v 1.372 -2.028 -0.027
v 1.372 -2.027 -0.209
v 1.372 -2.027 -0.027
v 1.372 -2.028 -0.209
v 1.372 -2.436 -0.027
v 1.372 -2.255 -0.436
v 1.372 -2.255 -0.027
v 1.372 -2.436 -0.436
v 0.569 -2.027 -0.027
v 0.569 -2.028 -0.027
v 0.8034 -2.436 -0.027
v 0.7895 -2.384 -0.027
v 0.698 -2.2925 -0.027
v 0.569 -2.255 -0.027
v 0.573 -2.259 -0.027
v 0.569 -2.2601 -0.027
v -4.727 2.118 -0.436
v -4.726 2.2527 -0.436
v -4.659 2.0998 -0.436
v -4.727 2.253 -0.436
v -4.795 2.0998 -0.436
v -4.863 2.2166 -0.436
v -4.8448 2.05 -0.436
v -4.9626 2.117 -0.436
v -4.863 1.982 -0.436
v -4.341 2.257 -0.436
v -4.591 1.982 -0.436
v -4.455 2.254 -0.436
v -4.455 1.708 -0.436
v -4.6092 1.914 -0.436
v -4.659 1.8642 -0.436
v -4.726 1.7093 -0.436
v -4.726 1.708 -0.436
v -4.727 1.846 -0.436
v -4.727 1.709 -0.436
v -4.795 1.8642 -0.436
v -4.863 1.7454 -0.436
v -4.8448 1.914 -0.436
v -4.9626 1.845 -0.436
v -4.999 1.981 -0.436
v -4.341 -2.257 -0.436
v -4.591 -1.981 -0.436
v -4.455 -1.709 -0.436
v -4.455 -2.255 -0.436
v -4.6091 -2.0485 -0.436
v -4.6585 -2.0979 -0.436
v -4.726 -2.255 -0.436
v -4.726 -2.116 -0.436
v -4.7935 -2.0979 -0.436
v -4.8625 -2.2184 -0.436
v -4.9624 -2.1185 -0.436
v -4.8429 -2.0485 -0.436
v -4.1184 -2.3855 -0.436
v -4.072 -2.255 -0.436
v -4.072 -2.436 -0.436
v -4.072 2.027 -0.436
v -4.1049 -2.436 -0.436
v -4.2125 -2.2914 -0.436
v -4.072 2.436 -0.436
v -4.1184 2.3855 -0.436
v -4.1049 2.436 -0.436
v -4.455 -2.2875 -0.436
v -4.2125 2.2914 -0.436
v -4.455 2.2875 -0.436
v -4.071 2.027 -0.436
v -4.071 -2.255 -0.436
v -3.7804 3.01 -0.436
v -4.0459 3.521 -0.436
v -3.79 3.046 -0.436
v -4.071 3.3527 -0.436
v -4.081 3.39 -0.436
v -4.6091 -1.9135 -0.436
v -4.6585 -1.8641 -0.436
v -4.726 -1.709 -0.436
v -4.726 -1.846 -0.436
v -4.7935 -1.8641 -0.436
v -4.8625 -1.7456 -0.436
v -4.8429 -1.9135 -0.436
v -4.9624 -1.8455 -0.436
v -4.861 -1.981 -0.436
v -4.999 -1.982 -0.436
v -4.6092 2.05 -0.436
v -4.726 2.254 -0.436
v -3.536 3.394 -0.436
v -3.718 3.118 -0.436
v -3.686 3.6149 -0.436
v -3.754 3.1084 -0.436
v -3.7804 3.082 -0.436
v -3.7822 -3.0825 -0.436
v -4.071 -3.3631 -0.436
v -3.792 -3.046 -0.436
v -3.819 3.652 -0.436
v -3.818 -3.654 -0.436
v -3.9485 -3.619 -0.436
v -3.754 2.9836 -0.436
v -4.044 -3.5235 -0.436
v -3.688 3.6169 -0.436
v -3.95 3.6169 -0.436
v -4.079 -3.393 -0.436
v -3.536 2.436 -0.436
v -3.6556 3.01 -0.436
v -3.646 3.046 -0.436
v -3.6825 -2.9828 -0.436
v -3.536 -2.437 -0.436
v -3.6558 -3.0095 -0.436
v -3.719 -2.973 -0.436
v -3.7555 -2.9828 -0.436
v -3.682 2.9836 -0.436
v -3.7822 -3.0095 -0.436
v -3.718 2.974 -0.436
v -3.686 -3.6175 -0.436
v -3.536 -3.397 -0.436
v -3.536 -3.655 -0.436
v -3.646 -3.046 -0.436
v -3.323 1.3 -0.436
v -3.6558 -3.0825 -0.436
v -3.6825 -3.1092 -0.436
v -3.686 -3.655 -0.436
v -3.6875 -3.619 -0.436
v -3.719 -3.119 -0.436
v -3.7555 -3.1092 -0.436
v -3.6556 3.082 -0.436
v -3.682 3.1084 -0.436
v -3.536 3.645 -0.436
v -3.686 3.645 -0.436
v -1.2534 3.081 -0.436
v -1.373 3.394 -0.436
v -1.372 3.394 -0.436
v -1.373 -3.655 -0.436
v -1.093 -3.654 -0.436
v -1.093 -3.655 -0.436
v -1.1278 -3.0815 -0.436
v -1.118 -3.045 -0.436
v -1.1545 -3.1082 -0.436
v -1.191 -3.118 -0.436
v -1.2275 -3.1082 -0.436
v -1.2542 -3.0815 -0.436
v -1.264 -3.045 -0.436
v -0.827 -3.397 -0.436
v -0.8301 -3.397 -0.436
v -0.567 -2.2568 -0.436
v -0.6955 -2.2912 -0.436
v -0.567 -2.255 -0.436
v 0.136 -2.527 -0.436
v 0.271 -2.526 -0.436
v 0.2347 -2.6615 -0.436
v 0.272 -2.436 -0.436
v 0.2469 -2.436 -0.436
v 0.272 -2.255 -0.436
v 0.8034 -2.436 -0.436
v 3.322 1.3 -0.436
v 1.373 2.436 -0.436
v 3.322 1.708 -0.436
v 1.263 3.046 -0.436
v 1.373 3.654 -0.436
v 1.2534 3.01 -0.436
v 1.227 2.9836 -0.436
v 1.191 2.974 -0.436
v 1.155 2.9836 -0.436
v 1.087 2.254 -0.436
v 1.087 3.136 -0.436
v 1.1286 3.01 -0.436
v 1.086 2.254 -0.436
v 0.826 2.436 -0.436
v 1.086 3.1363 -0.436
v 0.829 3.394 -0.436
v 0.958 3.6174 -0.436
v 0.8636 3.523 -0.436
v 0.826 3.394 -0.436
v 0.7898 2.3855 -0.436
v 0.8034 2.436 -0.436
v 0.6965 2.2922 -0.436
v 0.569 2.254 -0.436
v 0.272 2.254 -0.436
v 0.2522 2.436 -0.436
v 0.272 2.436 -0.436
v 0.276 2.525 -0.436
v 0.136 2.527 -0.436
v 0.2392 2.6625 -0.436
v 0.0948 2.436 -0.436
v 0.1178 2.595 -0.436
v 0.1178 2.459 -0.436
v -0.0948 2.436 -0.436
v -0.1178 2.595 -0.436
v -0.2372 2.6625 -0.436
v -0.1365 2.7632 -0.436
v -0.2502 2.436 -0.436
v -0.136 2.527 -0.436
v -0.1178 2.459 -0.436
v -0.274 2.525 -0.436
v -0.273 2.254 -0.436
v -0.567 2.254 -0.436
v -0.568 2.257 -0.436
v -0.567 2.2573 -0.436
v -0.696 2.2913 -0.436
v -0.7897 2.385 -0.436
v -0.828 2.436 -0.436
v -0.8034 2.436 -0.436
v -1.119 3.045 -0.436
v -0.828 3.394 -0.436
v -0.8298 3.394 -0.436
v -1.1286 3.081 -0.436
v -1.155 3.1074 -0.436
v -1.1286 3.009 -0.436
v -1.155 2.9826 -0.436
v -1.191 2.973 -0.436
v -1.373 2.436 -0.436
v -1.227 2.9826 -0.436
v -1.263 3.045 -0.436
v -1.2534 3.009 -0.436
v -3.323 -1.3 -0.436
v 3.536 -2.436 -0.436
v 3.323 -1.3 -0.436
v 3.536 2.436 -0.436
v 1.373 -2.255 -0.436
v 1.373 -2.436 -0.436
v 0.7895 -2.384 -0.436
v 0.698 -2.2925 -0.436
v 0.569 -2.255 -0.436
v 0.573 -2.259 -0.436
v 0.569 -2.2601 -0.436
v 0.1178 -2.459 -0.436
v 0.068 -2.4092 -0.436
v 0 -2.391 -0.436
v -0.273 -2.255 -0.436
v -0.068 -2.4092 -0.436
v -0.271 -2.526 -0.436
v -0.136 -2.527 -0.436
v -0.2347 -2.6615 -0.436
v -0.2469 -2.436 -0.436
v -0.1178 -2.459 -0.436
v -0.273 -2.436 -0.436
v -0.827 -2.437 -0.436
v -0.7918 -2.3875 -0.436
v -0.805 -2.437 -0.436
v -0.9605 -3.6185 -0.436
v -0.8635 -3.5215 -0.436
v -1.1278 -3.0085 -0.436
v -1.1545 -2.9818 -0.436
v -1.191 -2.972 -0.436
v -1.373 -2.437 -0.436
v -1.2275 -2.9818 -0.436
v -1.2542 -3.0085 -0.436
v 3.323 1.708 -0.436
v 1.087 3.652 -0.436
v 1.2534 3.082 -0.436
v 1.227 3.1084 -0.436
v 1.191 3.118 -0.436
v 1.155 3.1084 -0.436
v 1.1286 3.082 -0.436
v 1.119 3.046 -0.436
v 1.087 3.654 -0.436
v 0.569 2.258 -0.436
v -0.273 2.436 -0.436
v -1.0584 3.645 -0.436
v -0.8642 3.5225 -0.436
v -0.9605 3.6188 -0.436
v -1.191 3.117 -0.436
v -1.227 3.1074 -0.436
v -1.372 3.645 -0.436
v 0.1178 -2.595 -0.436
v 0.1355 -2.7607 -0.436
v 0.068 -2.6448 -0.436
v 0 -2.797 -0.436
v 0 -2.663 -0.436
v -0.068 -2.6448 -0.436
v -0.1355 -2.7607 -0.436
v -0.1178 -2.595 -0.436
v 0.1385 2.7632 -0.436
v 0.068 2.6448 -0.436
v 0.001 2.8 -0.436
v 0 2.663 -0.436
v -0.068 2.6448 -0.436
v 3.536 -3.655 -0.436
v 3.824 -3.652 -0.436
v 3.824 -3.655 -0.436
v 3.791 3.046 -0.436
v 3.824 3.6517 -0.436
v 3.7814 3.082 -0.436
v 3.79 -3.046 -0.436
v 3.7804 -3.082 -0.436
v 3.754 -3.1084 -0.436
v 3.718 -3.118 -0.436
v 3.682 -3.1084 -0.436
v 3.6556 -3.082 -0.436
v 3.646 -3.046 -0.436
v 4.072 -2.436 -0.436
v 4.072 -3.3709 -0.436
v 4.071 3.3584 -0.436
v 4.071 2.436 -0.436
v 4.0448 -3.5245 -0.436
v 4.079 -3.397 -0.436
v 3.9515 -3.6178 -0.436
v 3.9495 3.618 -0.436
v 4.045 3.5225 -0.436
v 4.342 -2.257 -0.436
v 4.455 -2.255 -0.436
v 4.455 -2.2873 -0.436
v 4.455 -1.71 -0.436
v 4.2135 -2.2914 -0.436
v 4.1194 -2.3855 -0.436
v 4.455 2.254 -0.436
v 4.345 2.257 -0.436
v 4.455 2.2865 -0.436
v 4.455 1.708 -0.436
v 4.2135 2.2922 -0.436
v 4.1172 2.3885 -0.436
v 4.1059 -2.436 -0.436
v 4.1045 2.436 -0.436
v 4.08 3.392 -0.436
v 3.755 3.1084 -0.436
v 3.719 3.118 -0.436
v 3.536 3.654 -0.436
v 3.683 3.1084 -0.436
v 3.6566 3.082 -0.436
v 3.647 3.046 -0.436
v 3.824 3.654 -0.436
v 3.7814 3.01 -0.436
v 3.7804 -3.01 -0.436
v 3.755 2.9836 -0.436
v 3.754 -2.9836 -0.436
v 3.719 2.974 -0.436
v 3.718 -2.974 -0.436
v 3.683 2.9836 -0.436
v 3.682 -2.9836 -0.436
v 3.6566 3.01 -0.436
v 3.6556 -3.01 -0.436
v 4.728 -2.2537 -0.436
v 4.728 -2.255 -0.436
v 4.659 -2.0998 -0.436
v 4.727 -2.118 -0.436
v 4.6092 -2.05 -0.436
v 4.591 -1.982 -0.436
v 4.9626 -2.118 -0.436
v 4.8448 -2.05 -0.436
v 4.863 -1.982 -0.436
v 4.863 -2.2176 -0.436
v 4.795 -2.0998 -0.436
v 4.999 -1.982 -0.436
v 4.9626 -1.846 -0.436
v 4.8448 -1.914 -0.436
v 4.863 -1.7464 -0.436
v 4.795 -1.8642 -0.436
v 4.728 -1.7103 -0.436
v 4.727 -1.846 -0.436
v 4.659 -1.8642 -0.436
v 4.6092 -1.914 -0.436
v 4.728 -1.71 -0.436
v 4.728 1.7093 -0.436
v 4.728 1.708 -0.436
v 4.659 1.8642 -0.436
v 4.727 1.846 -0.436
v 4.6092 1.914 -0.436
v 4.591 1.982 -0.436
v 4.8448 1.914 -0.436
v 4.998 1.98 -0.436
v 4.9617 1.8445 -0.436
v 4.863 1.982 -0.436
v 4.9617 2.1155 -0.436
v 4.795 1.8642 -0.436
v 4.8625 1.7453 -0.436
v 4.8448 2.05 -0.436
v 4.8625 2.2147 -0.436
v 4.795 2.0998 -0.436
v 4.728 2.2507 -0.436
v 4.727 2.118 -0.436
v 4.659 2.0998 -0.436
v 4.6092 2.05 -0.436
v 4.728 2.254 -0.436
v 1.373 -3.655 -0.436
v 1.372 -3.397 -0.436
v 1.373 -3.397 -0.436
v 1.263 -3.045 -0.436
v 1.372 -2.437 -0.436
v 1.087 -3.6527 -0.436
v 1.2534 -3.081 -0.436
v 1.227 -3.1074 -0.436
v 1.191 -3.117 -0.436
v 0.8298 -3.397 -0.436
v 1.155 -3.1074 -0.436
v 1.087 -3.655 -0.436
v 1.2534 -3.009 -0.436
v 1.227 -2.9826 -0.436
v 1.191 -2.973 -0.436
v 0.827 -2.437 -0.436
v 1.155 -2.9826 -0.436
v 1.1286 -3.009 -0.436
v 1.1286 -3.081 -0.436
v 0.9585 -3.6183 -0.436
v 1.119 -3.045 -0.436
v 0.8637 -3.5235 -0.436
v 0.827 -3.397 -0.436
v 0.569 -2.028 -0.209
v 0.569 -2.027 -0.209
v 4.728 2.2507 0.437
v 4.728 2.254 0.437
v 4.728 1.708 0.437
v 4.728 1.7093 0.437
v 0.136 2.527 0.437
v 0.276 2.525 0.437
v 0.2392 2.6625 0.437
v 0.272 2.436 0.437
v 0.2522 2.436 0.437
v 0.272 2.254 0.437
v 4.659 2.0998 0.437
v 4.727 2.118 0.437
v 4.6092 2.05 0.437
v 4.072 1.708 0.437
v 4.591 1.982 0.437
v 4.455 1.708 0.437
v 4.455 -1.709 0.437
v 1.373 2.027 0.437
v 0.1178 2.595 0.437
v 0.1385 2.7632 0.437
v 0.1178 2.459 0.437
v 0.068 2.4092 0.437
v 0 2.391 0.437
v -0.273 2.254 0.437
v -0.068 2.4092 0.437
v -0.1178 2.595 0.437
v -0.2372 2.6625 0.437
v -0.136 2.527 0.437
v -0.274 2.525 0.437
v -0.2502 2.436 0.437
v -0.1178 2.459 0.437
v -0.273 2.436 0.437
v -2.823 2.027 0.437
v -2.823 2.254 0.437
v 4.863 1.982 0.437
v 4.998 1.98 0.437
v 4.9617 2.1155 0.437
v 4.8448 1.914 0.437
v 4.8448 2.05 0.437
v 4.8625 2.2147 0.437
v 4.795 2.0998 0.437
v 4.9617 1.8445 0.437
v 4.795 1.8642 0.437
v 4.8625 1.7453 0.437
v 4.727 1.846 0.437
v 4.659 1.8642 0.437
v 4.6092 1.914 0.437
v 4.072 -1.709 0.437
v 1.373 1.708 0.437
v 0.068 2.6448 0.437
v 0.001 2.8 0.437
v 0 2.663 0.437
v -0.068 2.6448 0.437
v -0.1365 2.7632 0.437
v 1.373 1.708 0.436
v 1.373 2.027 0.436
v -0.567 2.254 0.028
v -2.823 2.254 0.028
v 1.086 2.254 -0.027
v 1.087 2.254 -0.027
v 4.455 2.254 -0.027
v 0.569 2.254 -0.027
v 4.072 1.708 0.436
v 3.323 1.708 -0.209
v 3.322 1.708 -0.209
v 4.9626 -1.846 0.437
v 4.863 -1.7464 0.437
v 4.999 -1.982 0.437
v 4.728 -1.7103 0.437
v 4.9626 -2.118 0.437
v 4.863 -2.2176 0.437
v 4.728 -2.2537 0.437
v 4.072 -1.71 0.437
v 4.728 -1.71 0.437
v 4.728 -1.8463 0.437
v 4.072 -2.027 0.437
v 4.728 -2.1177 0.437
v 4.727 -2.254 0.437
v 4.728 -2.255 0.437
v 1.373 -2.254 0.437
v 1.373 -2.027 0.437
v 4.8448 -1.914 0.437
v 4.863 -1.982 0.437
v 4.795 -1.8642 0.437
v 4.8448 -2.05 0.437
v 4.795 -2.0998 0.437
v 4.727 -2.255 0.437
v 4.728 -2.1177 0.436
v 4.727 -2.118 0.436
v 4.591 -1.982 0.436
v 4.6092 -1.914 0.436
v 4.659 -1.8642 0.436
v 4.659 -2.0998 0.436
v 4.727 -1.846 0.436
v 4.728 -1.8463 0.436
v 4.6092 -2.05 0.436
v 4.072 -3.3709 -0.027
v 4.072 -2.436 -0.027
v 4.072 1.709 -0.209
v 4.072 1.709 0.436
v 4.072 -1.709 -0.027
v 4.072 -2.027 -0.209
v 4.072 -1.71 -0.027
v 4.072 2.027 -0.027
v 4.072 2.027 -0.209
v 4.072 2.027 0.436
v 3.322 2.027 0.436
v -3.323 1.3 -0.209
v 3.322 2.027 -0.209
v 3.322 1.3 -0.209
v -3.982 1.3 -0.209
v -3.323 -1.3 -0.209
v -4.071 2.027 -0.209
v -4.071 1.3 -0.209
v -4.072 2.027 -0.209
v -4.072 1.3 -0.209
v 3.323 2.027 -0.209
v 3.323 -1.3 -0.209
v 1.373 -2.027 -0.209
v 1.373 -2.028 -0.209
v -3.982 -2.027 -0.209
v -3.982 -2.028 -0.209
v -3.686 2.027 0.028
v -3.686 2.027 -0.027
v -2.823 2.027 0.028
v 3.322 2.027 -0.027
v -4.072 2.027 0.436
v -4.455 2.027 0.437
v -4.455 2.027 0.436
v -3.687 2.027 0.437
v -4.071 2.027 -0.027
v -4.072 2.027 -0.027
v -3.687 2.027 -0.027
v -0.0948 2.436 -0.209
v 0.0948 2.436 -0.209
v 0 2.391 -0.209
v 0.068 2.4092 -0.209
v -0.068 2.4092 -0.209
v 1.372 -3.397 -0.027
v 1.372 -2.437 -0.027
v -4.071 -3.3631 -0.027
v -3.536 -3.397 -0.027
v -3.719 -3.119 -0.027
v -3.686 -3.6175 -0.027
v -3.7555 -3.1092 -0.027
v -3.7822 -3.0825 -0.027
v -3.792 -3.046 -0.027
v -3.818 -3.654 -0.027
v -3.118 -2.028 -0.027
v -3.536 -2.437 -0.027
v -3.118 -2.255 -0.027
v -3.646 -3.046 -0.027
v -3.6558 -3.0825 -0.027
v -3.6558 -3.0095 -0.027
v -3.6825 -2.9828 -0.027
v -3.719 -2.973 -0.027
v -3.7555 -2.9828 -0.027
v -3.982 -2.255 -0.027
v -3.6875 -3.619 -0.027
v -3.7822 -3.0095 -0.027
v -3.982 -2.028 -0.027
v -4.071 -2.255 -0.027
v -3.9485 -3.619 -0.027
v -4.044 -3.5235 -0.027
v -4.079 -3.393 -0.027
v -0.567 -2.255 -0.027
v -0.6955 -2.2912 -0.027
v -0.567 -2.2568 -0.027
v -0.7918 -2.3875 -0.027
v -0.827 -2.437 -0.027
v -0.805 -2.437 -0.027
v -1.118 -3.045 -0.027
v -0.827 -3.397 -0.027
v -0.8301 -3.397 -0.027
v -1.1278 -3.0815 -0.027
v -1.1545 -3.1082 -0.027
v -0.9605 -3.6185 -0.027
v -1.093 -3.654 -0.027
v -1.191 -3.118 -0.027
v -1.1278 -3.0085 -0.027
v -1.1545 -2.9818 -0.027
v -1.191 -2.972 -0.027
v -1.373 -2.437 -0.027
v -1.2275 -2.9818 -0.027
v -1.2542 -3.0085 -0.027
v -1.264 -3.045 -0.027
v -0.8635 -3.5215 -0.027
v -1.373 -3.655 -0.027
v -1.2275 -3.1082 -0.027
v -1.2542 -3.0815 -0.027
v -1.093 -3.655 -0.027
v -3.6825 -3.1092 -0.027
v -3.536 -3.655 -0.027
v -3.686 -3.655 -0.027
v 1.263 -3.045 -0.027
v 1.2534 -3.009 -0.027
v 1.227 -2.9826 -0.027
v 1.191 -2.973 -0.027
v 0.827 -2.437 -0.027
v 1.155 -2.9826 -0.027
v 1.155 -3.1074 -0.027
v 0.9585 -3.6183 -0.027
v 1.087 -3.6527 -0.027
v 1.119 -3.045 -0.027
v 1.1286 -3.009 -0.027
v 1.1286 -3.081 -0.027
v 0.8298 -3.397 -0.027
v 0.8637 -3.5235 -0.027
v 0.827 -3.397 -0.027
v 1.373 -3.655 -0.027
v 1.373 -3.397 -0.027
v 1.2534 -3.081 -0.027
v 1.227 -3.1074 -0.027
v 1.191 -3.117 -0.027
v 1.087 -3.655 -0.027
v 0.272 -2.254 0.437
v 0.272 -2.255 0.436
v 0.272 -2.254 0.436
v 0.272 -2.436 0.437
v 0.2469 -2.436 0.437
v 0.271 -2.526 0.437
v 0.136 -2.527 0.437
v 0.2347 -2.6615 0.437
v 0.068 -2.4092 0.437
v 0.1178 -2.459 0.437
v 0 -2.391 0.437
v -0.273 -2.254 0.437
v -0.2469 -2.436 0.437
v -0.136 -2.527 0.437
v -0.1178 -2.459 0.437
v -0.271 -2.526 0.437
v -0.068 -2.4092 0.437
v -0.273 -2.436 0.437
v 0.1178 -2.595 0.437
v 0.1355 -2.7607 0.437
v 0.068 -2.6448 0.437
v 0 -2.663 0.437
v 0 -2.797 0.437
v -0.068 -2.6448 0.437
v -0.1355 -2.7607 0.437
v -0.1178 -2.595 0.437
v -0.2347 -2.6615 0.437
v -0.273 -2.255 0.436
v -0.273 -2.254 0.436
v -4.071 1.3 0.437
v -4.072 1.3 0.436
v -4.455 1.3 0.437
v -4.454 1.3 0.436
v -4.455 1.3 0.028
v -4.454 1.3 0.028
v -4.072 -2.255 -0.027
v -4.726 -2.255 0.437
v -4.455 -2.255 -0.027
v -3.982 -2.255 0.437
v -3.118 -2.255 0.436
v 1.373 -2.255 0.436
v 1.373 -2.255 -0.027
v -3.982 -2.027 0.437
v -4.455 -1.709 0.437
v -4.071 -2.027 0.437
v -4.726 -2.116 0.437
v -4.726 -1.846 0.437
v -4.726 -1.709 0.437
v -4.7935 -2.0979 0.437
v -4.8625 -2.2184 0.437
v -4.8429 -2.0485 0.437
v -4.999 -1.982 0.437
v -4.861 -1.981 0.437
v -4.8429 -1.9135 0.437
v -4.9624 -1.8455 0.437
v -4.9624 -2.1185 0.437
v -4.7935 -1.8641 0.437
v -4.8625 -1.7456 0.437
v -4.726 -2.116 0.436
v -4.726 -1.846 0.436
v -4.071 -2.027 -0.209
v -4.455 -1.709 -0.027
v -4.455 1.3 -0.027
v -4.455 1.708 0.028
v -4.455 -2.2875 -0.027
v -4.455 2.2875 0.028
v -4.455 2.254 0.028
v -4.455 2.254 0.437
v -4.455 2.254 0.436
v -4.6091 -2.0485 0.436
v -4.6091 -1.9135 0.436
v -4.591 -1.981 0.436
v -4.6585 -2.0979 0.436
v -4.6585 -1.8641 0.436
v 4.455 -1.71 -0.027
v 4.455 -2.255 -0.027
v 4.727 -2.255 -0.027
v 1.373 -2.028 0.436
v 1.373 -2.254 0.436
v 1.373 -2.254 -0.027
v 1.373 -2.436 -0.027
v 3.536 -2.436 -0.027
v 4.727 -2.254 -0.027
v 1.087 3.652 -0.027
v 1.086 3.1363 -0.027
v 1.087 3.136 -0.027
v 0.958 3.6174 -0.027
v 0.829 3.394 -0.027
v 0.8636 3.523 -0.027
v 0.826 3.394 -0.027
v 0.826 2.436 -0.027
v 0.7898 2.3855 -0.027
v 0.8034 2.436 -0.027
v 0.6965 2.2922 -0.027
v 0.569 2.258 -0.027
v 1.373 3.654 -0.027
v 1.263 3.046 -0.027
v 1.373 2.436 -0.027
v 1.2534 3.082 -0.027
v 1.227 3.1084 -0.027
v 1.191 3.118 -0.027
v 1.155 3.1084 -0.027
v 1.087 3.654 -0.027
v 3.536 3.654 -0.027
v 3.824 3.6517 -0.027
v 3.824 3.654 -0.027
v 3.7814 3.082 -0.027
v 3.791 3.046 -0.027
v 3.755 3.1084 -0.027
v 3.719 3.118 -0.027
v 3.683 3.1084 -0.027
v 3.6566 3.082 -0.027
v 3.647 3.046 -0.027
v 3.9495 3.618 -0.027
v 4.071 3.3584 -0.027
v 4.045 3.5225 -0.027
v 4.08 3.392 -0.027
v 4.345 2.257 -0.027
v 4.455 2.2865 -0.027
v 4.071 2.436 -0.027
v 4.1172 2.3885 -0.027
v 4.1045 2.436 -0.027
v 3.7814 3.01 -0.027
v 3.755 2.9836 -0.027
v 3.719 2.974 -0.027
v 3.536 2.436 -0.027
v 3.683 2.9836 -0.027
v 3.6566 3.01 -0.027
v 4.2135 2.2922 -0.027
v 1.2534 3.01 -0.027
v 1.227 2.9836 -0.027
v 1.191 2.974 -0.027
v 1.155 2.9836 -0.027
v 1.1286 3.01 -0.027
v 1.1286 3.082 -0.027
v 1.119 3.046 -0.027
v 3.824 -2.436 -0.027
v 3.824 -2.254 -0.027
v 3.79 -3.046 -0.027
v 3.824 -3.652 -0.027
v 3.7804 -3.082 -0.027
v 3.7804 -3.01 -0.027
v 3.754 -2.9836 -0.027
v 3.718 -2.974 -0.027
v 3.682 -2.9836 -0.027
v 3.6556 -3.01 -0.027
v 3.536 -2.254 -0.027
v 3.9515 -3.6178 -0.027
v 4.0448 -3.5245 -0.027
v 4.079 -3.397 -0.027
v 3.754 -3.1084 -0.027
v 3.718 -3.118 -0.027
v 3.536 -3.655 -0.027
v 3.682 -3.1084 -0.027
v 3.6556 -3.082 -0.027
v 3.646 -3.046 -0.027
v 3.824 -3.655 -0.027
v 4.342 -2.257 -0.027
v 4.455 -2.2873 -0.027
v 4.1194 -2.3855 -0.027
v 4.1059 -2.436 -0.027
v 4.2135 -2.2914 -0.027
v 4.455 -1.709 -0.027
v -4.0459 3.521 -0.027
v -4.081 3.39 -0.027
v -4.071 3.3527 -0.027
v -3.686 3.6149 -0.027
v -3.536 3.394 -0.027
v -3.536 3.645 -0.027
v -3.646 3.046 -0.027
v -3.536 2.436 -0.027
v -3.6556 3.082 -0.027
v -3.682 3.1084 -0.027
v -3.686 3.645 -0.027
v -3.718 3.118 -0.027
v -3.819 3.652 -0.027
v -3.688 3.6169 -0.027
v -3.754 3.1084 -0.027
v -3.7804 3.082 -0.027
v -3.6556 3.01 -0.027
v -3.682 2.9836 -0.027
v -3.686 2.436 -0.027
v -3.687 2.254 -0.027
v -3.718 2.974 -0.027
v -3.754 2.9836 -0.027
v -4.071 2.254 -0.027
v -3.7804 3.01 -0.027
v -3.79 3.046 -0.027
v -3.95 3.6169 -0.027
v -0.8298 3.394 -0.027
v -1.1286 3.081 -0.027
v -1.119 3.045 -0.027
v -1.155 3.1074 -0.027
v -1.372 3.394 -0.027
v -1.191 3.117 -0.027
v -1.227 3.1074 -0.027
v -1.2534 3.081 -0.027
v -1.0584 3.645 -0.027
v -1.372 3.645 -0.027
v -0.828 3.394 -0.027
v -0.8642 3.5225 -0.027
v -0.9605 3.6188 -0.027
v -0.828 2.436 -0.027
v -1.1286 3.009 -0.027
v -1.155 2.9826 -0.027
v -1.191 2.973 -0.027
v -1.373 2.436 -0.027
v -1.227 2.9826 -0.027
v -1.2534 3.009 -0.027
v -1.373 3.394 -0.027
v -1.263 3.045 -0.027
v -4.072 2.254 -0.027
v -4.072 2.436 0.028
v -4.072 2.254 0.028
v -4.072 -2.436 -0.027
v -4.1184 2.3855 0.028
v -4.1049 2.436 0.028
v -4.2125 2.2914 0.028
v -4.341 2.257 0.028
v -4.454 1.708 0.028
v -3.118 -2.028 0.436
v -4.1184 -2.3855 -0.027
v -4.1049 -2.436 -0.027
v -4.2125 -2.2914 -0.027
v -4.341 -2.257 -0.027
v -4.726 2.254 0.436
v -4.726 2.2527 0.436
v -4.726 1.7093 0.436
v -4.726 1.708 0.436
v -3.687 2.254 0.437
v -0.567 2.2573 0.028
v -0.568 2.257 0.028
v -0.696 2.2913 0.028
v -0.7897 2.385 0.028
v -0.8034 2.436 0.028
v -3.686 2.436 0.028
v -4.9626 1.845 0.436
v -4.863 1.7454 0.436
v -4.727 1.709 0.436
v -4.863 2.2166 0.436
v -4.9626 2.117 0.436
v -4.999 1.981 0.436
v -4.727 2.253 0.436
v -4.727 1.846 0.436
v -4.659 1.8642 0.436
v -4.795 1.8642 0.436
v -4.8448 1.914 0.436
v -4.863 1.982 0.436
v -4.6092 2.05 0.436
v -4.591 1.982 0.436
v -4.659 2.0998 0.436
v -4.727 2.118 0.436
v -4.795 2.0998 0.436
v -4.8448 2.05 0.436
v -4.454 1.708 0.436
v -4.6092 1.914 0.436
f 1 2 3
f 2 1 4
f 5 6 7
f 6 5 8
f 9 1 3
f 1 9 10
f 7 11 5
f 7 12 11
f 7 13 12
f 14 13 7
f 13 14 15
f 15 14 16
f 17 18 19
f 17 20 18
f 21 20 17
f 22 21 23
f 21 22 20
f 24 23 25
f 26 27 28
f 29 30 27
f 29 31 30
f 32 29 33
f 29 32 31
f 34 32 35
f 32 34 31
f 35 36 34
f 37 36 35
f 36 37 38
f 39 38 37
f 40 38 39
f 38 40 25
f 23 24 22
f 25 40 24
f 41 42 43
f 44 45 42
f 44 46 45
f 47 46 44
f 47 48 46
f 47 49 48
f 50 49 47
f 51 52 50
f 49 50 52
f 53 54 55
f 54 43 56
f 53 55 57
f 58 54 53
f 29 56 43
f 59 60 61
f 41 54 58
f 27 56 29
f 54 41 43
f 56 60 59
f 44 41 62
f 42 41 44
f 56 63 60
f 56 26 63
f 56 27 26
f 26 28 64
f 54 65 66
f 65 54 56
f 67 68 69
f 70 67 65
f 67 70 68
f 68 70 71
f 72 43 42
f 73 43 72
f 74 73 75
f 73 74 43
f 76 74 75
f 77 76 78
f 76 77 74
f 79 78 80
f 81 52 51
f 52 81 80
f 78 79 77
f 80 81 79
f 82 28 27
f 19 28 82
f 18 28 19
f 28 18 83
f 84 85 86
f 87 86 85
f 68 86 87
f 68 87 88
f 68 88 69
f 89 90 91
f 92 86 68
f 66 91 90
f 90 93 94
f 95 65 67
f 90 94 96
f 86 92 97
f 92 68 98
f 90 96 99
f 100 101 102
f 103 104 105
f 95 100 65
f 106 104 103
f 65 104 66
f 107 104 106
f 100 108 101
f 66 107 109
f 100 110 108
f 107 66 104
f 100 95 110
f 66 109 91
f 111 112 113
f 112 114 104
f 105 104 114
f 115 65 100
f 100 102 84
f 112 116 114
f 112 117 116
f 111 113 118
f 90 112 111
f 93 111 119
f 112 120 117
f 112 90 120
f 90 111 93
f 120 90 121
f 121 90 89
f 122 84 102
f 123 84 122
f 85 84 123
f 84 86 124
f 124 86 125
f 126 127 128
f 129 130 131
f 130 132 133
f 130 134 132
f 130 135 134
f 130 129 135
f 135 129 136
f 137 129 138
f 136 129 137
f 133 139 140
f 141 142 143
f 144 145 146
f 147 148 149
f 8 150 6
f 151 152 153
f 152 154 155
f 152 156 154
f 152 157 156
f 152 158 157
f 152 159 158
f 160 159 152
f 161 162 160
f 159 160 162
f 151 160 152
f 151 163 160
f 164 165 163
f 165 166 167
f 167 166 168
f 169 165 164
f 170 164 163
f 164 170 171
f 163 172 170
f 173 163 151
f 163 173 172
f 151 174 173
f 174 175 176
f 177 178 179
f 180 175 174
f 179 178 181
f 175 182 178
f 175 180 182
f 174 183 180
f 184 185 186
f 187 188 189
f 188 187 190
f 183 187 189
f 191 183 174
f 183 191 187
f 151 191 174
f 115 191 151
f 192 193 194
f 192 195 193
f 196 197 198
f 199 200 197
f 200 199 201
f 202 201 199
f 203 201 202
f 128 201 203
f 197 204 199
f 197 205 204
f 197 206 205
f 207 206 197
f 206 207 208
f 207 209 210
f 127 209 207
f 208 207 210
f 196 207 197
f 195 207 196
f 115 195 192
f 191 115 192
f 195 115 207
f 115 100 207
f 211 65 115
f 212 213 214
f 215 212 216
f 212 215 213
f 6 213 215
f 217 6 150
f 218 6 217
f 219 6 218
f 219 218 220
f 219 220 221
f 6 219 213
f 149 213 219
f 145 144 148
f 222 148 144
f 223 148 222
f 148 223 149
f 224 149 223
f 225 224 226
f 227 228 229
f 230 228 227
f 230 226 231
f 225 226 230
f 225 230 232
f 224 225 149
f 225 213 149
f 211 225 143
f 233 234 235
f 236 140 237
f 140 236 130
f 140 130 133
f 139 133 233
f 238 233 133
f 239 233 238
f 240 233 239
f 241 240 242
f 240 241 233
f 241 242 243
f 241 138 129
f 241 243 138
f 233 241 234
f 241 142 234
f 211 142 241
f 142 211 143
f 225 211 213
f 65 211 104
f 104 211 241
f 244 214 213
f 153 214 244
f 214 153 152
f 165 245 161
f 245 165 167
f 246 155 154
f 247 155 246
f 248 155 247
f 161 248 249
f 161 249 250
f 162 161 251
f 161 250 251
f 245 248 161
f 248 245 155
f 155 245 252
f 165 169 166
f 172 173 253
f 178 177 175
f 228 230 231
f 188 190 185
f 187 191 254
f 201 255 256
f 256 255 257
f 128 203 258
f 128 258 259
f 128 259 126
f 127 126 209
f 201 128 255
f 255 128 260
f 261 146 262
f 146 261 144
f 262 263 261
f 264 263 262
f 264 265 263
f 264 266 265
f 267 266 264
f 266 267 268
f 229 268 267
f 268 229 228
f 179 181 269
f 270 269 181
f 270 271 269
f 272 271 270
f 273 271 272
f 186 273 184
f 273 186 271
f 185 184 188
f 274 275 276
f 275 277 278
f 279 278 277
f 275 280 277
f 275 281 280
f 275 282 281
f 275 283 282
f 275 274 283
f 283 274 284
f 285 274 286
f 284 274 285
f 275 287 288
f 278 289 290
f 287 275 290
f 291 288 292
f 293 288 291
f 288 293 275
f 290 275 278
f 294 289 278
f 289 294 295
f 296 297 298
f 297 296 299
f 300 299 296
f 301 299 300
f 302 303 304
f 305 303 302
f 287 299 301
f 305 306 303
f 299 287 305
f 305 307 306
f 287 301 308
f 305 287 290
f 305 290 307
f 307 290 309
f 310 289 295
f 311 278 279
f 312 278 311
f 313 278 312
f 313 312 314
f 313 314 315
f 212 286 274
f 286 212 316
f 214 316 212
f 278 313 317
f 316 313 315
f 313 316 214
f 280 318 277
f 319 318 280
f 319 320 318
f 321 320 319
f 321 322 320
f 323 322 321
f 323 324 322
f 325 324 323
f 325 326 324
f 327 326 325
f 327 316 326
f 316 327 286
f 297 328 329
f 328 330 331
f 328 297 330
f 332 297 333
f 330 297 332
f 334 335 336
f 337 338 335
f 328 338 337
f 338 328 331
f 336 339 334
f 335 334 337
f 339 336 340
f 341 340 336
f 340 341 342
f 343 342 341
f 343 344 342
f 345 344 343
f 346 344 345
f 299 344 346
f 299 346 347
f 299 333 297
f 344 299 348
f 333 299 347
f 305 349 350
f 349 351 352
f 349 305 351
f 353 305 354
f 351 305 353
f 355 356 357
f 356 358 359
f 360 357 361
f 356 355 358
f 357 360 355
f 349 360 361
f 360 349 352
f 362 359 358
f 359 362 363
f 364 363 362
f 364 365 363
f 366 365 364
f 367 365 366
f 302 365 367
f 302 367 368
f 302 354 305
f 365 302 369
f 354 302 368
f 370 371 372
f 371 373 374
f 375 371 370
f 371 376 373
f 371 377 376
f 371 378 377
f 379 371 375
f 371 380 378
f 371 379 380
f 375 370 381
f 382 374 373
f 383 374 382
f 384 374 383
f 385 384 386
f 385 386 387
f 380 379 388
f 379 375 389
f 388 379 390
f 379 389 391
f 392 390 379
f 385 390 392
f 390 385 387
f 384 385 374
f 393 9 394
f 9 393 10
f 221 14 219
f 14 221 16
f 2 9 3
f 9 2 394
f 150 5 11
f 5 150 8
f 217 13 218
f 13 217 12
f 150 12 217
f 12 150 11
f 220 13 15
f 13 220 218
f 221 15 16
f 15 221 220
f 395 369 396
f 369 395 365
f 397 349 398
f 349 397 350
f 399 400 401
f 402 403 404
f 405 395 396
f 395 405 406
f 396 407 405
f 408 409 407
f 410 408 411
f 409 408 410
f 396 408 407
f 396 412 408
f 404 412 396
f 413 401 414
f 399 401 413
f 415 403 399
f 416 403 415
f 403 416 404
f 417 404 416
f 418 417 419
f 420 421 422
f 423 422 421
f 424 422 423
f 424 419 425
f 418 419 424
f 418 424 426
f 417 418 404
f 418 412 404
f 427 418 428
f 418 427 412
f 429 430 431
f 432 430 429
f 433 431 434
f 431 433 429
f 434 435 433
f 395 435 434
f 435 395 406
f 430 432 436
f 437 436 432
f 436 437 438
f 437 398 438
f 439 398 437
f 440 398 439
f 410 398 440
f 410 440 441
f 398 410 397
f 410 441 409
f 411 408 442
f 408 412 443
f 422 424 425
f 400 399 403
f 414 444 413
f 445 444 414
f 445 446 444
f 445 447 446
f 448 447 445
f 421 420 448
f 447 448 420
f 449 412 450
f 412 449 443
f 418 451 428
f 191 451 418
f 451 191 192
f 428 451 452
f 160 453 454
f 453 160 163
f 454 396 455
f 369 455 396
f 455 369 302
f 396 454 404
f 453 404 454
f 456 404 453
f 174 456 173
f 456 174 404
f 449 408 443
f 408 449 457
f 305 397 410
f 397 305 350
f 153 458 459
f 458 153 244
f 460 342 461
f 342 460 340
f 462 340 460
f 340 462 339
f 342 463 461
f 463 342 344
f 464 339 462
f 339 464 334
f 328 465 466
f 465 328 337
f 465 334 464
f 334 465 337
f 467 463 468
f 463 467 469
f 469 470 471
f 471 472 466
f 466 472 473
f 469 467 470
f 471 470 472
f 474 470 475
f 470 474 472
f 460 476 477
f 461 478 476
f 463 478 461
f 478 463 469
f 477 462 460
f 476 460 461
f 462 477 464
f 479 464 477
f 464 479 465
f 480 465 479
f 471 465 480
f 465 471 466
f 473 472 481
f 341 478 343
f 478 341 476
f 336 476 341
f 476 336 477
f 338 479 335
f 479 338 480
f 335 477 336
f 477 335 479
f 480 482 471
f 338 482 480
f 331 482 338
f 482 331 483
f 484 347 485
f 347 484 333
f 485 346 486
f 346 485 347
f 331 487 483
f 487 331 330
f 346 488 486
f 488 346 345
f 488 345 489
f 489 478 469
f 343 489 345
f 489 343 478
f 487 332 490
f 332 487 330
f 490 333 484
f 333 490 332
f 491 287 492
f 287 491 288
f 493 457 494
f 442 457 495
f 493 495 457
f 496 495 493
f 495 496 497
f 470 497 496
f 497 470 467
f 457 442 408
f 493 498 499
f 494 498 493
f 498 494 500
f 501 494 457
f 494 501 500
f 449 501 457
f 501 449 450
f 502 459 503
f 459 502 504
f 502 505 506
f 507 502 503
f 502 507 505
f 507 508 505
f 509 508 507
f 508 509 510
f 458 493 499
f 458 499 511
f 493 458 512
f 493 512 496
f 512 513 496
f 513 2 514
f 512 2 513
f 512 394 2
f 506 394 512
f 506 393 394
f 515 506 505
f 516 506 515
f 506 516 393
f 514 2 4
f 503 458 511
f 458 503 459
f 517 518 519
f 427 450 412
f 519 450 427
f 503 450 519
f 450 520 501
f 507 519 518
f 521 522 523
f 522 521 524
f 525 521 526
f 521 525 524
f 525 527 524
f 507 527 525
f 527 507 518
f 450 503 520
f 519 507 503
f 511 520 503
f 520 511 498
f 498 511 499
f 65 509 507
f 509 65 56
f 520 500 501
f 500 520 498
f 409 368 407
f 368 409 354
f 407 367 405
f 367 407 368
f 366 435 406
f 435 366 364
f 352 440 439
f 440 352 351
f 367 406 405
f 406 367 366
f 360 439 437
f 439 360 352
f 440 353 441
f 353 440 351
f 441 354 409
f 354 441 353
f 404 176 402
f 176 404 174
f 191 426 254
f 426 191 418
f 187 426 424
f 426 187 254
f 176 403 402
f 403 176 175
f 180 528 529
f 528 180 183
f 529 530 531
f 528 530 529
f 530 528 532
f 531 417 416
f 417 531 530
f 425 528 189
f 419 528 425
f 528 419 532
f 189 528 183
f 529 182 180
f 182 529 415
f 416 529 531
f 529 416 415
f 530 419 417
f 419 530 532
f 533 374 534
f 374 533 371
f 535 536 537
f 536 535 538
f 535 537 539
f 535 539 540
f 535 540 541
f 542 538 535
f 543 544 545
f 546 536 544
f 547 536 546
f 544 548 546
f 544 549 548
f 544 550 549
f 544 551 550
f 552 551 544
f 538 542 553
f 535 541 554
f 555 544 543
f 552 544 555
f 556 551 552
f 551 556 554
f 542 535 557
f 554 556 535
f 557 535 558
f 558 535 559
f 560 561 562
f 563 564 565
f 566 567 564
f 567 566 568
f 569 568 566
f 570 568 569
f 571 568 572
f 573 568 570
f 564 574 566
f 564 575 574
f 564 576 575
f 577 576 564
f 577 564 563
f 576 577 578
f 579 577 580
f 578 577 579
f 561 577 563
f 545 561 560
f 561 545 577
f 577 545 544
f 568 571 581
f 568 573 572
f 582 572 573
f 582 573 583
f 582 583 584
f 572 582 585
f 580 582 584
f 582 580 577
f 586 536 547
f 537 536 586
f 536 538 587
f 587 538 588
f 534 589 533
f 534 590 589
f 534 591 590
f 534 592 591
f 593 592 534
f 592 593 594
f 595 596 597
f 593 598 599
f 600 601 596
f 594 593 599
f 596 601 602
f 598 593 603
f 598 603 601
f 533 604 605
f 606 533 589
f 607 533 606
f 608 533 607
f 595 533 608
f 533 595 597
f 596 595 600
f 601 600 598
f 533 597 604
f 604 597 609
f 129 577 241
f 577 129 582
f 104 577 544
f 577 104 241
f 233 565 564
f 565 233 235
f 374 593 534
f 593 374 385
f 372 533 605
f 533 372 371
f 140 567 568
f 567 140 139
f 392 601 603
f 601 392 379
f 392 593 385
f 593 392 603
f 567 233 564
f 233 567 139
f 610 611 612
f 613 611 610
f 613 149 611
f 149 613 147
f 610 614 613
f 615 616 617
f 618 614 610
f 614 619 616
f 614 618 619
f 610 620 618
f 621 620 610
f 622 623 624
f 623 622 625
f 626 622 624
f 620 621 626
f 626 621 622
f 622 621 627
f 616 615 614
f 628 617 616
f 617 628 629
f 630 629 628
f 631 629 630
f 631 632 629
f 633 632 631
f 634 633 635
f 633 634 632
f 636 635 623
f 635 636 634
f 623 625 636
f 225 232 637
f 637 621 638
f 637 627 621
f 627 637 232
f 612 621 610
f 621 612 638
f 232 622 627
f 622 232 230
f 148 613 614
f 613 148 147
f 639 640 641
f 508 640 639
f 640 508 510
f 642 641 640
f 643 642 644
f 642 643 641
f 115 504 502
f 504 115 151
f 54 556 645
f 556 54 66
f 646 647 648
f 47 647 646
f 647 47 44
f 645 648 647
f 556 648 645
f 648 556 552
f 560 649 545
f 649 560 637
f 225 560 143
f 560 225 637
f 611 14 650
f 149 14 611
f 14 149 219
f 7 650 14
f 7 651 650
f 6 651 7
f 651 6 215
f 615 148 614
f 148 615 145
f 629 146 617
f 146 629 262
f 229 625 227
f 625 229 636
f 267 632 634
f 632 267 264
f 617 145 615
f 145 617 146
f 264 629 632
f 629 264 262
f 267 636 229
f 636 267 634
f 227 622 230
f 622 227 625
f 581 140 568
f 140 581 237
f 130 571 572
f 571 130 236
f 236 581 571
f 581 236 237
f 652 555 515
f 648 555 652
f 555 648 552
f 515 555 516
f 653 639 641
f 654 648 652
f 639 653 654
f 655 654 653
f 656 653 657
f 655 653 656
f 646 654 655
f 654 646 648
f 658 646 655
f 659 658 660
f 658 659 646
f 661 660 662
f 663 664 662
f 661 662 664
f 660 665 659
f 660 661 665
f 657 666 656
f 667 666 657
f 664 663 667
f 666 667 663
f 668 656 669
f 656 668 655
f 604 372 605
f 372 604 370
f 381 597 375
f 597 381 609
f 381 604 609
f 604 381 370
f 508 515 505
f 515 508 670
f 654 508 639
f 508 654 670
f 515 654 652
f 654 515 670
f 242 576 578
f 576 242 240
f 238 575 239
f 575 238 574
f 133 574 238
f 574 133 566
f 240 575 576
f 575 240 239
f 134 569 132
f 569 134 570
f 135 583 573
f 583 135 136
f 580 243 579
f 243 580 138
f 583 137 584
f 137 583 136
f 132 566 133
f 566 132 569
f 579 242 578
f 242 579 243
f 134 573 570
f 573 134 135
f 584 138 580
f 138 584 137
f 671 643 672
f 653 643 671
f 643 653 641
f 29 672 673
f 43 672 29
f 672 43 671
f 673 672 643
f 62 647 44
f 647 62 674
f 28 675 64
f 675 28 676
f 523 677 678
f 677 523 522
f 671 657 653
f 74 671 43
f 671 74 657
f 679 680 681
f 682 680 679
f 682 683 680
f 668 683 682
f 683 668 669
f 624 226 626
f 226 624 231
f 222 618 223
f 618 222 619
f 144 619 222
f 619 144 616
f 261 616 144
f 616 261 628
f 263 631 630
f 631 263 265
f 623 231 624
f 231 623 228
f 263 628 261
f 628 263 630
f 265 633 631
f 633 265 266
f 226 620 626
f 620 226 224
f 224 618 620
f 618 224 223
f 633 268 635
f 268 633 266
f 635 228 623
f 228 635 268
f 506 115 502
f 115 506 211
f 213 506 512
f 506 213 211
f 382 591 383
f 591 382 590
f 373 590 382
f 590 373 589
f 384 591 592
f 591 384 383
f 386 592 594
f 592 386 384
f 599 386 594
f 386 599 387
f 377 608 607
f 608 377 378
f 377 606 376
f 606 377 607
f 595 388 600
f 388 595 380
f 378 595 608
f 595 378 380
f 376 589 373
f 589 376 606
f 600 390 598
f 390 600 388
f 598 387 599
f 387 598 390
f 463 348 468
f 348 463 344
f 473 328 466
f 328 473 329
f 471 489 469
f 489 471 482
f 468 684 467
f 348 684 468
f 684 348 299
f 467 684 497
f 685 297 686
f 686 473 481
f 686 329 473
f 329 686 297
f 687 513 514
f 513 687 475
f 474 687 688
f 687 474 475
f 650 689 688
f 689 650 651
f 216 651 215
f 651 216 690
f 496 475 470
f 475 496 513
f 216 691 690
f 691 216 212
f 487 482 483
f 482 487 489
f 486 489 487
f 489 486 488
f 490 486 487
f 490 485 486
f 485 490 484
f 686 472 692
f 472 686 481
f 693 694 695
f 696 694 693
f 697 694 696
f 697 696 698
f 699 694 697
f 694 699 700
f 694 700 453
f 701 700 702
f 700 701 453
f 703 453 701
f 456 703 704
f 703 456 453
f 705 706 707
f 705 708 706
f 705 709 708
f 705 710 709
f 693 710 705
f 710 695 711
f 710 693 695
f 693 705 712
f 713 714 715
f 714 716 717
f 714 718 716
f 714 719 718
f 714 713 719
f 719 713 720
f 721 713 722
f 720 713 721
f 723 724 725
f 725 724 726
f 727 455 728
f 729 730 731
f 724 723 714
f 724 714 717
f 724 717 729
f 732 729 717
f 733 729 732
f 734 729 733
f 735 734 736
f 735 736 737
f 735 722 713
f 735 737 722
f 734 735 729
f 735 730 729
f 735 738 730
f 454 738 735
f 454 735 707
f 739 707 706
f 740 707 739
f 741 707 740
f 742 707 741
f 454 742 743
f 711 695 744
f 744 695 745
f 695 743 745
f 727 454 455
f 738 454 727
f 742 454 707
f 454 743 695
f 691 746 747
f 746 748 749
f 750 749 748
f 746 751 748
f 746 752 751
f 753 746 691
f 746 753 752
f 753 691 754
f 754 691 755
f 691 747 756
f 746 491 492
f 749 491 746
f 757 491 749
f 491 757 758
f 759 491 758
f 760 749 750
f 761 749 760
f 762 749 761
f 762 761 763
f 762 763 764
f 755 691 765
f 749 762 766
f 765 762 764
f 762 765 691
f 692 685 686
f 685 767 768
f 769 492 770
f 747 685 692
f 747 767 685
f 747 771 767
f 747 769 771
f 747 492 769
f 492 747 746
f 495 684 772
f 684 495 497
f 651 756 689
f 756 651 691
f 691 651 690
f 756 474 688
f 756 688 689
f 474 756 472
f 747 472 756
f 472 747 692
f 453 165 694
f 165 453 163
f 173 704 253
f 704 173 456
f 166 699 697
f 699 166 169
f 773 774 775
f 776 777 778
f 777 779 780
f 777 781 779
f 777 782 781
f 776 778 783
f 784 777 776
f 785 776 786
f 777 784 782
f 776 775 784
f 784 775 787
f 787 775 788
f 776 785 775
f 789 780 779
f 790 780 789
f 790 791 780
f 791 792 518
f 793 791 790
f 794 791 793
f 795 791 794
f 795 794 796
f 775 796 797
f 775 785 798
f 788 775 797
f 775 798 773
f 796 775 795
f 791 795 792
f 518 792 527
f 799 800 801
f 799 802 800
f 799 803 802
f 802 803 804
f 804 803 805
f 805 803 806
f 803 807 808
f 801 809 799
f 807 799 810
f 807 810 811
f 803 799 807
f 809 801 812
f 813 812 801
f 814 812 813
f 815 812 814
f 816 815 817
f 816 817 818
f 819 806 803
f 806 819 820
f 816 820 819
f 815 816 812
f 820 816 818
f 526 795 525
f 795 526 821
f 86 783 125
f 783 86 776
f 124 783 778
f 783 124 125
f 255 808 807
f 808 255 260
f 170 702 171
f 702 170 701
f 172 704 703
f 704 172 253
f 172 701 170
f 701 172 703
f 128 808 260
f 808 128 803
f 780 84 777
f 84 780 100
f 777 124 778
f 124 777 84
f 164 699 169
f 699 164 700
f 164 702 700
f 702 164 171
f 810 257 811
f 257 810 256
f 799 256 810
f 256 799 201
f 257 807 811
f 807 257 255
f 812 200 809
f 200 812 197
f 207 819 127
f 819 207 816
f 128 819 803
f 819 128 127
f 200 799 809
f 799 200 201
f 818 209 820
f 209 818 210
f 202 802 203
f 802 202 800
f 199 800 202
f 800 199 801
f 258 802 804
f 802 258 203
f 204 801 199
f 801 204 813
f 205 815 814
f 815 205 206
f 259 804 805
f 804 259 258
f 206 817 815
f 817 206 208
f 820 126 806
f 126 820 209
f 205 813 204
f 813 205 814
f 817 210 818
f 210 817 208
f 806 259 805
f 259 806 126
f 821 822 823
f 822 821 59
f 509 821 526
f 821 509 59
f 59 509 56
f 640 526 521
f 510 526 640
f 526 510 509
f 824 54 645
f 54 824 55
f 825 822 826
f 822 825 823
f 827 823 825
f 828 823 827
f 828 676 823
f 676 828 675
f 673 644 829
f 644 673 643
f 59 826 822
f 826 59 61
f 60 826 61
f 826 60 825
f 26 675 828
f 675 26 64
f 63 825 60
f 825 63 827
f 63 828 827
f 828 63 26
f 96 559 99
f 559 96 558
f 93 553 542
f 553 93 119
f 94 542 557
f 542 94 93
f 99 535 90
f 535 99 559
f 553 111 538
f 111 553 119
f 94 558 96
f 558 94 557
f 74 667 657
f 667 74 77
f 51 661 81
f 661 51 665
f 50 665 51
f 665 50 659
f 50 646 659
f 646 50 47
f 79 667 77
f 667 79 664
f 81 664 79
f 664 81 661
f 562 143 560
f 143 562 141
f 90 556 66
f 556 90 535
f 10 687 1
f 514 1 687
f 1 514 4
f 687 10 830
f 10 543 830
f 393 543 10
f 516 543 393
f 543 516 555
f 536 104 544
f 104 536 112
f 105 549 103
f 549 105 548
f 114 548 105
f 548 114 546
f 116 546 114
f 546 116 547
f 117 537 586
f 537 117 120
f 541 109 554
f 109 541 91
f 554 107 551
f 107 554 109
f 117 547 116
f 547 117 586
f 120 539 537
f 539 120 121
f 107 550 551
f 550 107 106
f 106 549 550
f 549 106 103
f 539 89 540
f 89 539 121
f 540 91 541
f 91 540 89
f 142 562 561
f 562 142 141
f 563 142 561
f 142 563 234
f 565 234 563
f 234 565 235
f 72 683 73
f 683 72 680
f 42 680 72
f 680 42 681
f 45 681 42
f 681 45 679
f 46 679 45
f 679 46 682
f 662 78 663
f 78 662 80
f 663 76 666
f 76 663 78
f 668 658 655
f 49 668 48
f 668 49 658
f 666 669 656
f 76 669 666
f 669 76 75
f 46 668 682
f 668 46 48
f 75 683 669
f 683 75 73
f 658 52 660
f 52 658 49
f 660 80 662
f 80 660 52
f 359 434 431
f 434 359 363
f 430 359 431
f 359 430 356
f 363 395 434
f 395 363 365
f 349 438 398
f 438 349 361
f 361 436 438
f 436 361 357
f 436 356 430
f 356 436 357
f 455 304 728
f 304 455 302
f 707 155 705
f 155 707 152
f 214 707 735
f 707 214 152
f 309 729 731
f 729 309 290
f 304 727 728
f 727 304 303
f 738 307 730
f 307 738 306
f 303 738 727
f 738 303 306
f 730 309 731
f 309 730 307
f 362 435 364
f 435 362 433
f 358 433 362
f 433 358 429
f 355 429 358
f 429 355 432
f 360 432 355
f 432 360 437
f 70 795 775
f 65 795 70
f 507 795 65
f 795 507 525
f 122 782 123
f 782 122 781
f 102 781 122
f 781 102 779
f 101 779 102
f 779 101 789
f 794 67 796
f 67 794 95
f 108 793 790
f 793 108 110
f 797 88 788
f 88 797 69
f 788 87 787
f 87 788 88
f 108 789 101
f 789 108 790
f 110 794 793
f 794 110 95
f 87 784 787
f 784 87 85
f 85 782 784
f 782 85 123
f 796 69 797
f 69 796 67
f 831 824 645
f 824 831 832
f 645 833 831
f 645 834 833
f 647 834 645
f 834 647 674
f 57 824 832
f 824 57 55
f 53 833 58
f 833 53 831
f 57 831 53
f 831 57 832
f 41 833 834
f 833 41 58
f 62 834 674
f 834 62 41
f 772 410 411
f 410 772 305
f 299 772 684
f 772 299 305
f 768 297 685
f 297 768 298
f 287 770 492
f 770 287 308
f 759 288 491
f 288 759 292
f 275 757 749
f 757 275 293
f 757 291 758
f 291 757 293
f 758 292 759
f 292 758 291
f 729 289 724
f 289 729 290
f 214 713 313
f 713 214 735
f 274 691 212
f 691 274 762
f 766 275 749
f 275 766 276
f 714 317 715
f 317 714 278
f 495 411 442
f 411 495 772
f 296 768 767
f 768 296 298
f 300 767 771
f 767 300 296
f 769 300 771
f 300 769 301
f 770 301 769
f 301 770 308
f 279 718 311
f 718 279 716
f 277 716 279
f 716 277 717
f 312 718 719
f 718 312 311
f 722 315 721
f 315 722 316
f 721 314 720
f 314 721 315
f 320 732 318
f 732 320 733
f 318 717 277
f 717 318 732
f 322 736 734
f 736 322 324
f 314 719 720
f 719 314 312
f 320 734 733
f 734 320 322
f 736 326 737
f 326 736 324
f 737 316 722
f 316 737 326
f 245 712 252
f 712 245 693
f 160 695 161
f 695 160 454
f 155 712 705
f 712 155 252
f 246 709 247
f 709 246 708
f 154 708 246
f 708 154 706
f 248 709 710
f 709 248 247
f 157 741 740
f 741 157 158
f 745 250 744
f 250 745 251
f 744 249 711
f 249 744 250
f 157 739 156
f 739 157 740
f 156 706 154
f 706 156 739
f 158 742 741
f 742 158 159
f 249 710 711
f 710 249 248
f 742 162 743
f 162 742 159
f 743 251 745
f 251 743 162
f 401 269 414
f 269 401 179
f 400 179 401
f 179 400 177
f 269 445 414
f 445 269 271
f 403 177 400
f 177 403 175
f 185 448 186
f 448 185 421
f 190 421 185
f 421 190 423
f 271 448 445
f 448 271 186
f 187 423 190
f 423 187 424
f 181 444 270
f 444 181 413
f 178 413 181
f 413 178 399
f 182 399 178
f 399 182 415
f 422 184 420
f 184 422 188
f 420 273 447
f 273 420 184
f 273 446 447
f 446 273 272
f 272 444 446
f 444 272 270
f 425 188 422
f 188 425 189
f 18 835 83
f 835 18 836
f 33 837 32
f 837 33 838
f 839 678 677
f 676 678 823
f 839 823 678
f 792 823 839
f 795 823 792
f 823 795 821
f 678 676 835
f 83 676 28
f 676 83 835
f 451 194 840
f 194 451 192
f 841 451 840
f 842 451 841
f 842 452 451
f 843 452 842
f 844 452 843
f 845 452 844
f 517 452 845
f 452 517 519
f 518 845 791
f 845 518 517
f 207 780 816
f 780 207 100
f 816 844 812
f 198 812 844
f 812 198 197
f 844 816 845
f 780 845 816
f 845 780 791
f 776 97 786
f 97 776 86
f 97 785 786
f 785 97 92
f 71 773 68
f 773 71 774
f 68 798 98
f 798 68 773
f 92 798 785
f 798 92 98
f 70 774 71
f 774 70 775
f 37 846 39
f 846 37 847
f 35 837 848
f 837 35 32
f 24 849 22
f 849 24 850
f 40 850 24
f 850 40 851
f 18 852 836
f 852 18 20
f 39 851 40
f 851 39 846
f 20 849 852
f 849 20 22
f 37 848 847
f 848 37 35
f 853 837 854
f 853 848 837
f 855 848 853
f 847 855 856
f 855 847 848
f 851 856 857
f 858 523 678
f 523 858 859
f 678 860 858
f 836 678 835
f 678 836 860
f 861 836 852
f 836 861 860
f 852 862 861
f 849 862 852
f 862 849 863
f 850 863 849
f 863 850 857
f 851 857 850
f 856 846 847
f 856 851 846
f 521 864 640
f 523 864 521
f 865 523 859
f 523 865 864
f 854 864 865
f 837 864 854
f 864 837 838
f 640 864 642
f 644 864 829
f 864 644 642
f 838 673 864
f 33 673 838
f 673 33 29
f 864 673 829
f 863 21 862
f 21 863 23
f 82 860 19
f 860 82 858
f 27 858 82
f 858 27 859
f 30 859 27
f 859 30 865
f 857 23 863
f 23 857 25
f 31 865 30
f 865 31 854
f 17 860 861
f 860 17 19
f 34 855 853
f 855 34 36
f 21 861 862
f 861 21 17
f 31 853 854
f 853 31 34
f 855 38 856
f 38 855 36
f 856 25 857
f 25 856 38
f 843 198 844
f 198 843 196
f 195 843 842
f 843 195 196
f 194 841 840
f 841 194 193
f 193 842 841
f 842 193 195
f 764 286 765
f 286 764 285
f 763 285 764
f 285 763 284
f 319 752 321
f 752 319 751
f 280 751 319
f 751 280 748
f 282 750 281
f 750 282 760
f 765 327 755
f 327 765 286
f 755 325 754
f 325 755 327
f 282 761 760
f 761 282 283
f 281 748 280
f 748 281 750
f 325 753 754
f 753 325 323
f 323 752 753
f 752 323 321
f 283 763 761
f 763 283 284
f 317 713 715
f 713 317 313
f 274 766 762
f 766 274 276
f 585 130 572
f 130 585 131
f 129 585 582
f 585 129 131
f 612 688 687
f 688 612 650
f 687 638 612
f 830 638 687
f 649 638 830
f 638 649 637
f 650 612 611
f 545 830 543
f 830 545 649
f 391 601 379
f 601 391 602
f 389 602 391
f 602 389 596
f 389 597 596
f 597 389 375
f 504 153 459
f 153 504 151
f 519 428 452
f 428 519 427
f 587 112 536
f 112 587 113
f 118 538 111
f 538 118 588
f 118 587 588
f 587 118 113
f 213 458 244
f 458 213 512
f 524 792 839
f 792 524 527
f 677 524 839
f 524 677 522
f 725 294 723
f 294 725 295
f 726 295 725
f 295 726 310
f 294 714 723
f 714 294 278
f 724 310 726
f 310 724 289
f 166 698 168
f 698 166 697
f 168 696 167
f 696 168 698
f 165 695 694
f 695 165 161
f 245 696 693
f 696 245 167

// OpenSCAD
intersection() {
union() {
difference() {
translate([0.569, -2.436, -0.436]) cube(size = [0.803, 0.409, 0.409], center = false);
translate([0.573, -2.509, -18.1])
cylinder(h = 18.073, r1 = 0.25, r2 = 0.25, center = false, $fn = 12);
}
difference() {
union() {
translate([1.373, 1.708, -0.436]) cube(size = [3.355, 0.546, 0.873], center = false);
translate([4.727, -1.982, -0.436])
cylinder(h = 0.873, r1 = 0.272, r2 = 0.272, center = false, $fn = 12);
}
union() {
translate([4.727, -1.982, -0.436])
cylinder(h = 18.536, r1 = 0.136, r2 = 0.136, center = false, $fn = 12);
translate([-18.1, -3.397, -0.209]) cube(size = [22.172, 5.424, 0.645], center = false);
translate([4.727, 1.982, -18.1])
cylinder(h = 36.2, r1 = 0.136, r2 = 0.136, center = false, $fn = 12);
}
}
difference() {
translate([-0.273, 2.027, -0.436]) cube(size = [0.545, 0.409, 0.873], center = false);
translate([0, 2.527, -0.209])
cylinder(h = 18.309, r1 = 0.136, r2 = 0.136, center = false, $fn = 12);
}
difference() {
union() {
translate([-0.273, -2.436, -0.436]) cube(size = [0.545, 0.182, 0.873], center = false);
translate([-4.455, -2.255, -0.436]) cube(size = [8.278, 3.555, 0.227], center = false);
translate([0, -2.526, -0.436])
cylinder(h = 0.873, r1 = 0.271, r2 = 0.271, center = false, $fn = 12);
translate([-1.093, -3.389, -0.436])
cylinder(h = 0.409, r1 = 0.265, r2 = 0.265, center = false, $fn = 12);
difference() {
translate([-1.373, -3.397, -0.436]) cube(size = [2.745, 0.96, 0.409], center = false);
translate([-0.827, -3.397, -18.1]) cube(size = [1.654, 0.96, 36.2], center = false);
}
translate([-4.726, -2.255, -0.436]) cube(size = [0.744, 3.555, 0.873], center = false);
translate([1.087, -3.655, -0.436]) cube(size = [0.286, 0.258, 0.409], center = false);
}
union() {
translate([-4.071, -2.027, -0.209]) cube(size = [0.089, 3.327, 18.309], center = false);
translate([-1.191, -3.045, -18.1])
cylinder(h = 36.2, r1 = 0.073, r2 = 0.073, center = false, $fn = 12);
translate([-4.726, -1.709, -0.436]) cube(size = [0.271, 3.009, 0.873], center = false);
translate([-4.726, -1.982, -18.1])
cylinder(h = 18.536, r1 = 0.273, r2 = 0.273, center = false, $fn = 12);
translate([0, -2.527, -0.436])
cylinder(h = 18.536, r1 = 0.136, r2 = 0.136, center = false, $fn = 12);
translate([-3.323, -1.3, -0.436]) cube(size = [7.147, 2.6, 0.409], center = false);
translate([1.191, -3.045, -18.1])
cylinder(h = 36.2, r1 = 0.072, r2 = 0.072, center = false, $fn = 12);
}
}
difference() {
union() {
translate([4.072, -2.255, -0.436]) cube(size = [0.656, 0.545, 0.873], center = false);
translate([1.373, -2.436, -0.436]) cube(size = [2.699, 0.409, 0.873], center = false);
}
union() {
translate([4.727, -1.982, -18.1])
cylinder(h = 18.536, r1 = 0.272, r2 = 0.272, center = false, $fn = 12);
translate([-18.1, -2.436, -0.027]) cube(size = [22.827, 0.182, 0.464], center = false);
}
}
difference() {
difference() {
union() {
translate([0.569, 2.027, -0.436]) cube(size = [0.517, 1.367, 0.409], center = false);
translate([-3.686, 3.384, -0.436]) cube(size = [2.859, 0.261, 0.409], center = false);
}
translate([0.569, 2.513, -18.1])
cylinder(h = 18.536, r1 = 0.255, r2 = 0.255, center = false, $fn = 12);
}
difference() {
union() {
translate([-3.536, 2.255, -0.436]) cube(size = [2.164, 1.4, 0.873], center = false);
translate([-1.093, 2.436, -0.436]) cube(size = [1.919, 1.218, 0.873], center = false);
}
translate([-1.092, 3.391, -0.436])
cylinder(h = 18.536, r1 = 0.263, r2 = 0.263, center = false, $fn = 12);
}
}
difference() {
translate([-1.373, 2.027, -0.436]) cube(size = [0.545, 1.367, 0.409], center = false);
translate([-1.191, 3.045, -18.1])
cylinder(h = 18.536, r1 = 0.072, r2 = 0.072, center = false, $fn = 12);
}
difference() {
translate([-4.455, 1.3, -0.436]) cube(size = [0.383, 1.136, 0.464], center = false);
translate([-4.341, 2.514, -18.1])
cylinder(h = 36.2, r1 = 0.257, r2 = 0.257, center = false, $fn = 12);
}
translate([-1.373, -3.655, -0.436]) cube(size = [0.28, 0.258, 0.409], center = false);
difference() {
union() {
translate([-3.818, -3.393, -0.436])
cylinder(h = 0.409, r1 = 0.261, r2 = 0.261, center = false, $fn = 12);
translate([-4.726, -1.982, -0.436])
cylinder(h = 0.873, r1 = 0.273, r2 = 0.273, center = false, $fn = 12);
translate([-4.071, -3.397, -0.436]) cube(size = [3.504, 1.369, 0.409], center = false);
}
union() {
translate([-3.536, -3.397, -0.436]) cube(size = [2.969, 0.96, 18.536], center = false);
translate([-3.719, -3.046, -0.436])
cylinder(h = 18.536, r1 = 0.073, r2 = 0.073, center = false, $fn = 12);
translate([-0.564, -2.519, -0.436])
cylinder(h = 18.536, r1 = 0.263, r2 = 0.263, center = false, $fn = 12);
translate([-4.726, -1.981, -0.436])
cylinder(h = 18.536, r1 = 0.135, r2 = 0.135, center = false, $fn = 12);
}
}
difference() {
union() {
translate([4.727, 1.98, -0.436])
cylinder(h = 0.873, r1 = 0.271, r2 = 0.271, center = false, $fn = 12);
translate([1.373, 2.027, -0.436]) cube(size = [3.082, 0.409, 0.409], center = false);
}
union() {
translate([4.345, 2.52, -18.1])
cylinder(h = 36.2, r1 = 0.263, r2 = 0.263, center = false, $fn = 12);
translate([4.727, 1.982, -18.1])
cylinder(h = 36.2, r1 = 0.136, r2 = 0.136, center = false, $fn = 12);
}
}
translate([-3.118, -2.255, -0.209]) cube(size = [4.491, 0.227, 0.645], center = false);
translate([1.088, -3.394, -0.436])
cylinder(h = 0.409, r1 = 0.259, r2 = 0.259, center = false, $fn = 12);
difference() {
translate([-4.071, 2.027, -0.436]) cube(size = [0.535, 1.367, 0.409], center = false);
translate([-3.718, 3.046, -18.1])
cylinder(h = 18.073, r1 = 0.072, r2 = 0.072, center = false, $fn = 12);
}
difference() {
translate([-4.455, -2.436, -0.436]) cube(size = [0.383, 3.736, 0.409], center = false);
translate([-4.341, -2.514, -18.1])
cylinder(h = 36.2, r1 = 0.257, r2 = 0.257, center = false, $fn = 12);
}
difference() {
union() {
translate([4.072, -2.436, -0.436]) cube(size = [0.383, 4.145, 0.873], center = false);
translate([3.824, -3.397, -0.436])
cylinder(h = 0.409, r1 = 0.255, r2 = 0.255, center = false, $fn = 12);
translate([3.536, 2.027, -0.436]) cube(size = [0.535, 1.367, 0.409], center = false);
translate([3.824, -3.397, -0.436]) cube(size = [0.248, 1.369, 0.409], center = false);
}
union() {
translate([3.536, -2.436, -0.027]) cube(size = [14.564, 0.727, 18.127], center = false);
translate([4.342, -2.514, -18.1])
cylinder(h = 18.536, r1 = 0.257, r2 = 0.257, center = false, $fn = 12);
translate([3.719, 3.046, -18.1])
cylinder(h = 36.2, r1 = 0.072, r2 = 0.072, center = false, $fn = 12);
}
}
translate([-4.455, 1.3, -0.436]) cube(size = [7.777, 0.727, 0.227], center = false);
translate([-2.823, 2.027, -0.436]) cube(size = [6.145, 0.227, 0.873], center = false);
translate([-3.686, -3.655, -0.436]) cube(size = [0.15, 0.258, 0.409], center = false);
difference() {
translate([1.087, 2.027, -0.436]) cube(size = [0.286, 1.627, 0.409], center = false);
translate([1.191, 3.046, -0.436])
cylinder(h = 18.536, r1 = 0.072, r2 = 0.072, center = false, $fn = 12);
}
difference() {
translate([0.001, 2.525, -0.436])
cylinder(h = 0.873, r1 = 0.275, r2 = 0.275, center = false, $fn = 12);
translate([0, 2.527, -18.1])
cylinder(h = 36.2, r1 = 0.136, r2 = 0.136, center = false, $fn = 12);
}
translate([3.323, -2.436, -0.436]) cube(size = [0.749, 4.464, 0.227], center = false);
intersection() {
union() {
translate([-4.726, -18.1, -0.436]) cube(size = [0.654, 20.354, 0.873], center = false);
translate([-3.686, 2.027, -0.436]) cube(size = [3.119, 0.409, 0.464], center = false);
translate([-3.819, 3.39, -0.436])
cylinder(h = 0.409, r1 = 0.262, r2 = 0.262, center = false, $fn = 12);
translate([-4.727, 1.981, -0.436])
cylinder(h = 18.536, r1 = 0.272, r2 = 0.272, center = false, $fn = 12);
}
difference() {
difference() {
translate([-18.1, 1.3, -18.1]) cube(size = [19.473, 16.8, 18.536], center = false);
translate([-18.1, 1.3, -0.436]) cube(size = [13.646, 0.408, 18.536], center = false);
}
union() {
translate([-4.727, 1.982, -18.1])
cylinder(h = 36.2, r1 = 0.136, r2 = 0.136, center = false, $fn = 12);
translate([-0.568, 2.513, -18.1])
cylinder(h = 36.2, r1 = 0.256, r2 = 0.256, center = false, $fn = 12);
}
}
}
translate([-4.455, 2.027, -0.027]) cube(size = [0.768, 0.227, 0.464], center = false);
difference() {
translate([3.536, -3.655, -0.436]) cube(size = [0.288, 7.309, 0.409], center = false);
union() {
translate([3.718, -3.046, -0.436])
cylinder(h = 18.536, r1 = 0.072, r2 = 0.072, center = false, $fn = 12);
translate([3.536, -2.027, -18.1]) cube(size = [0.288, 5.421, 36.2], center = false);
}
}
translate([3.819, 3.392, -0.436])
cylinder(h = 0.409, r1 = 0.261, r2 = 0.261, center = false, $fn = 12);
translate([1.087, 3.394, -0.436])
cylinder(h = 0.409, r1 = 0.258, r2 = 0.258, center = false, $fn = 12);
}
translate([-6, -4.385, -0.524]) cube(size = [12, 8.771, 1.047], center = false);
}
